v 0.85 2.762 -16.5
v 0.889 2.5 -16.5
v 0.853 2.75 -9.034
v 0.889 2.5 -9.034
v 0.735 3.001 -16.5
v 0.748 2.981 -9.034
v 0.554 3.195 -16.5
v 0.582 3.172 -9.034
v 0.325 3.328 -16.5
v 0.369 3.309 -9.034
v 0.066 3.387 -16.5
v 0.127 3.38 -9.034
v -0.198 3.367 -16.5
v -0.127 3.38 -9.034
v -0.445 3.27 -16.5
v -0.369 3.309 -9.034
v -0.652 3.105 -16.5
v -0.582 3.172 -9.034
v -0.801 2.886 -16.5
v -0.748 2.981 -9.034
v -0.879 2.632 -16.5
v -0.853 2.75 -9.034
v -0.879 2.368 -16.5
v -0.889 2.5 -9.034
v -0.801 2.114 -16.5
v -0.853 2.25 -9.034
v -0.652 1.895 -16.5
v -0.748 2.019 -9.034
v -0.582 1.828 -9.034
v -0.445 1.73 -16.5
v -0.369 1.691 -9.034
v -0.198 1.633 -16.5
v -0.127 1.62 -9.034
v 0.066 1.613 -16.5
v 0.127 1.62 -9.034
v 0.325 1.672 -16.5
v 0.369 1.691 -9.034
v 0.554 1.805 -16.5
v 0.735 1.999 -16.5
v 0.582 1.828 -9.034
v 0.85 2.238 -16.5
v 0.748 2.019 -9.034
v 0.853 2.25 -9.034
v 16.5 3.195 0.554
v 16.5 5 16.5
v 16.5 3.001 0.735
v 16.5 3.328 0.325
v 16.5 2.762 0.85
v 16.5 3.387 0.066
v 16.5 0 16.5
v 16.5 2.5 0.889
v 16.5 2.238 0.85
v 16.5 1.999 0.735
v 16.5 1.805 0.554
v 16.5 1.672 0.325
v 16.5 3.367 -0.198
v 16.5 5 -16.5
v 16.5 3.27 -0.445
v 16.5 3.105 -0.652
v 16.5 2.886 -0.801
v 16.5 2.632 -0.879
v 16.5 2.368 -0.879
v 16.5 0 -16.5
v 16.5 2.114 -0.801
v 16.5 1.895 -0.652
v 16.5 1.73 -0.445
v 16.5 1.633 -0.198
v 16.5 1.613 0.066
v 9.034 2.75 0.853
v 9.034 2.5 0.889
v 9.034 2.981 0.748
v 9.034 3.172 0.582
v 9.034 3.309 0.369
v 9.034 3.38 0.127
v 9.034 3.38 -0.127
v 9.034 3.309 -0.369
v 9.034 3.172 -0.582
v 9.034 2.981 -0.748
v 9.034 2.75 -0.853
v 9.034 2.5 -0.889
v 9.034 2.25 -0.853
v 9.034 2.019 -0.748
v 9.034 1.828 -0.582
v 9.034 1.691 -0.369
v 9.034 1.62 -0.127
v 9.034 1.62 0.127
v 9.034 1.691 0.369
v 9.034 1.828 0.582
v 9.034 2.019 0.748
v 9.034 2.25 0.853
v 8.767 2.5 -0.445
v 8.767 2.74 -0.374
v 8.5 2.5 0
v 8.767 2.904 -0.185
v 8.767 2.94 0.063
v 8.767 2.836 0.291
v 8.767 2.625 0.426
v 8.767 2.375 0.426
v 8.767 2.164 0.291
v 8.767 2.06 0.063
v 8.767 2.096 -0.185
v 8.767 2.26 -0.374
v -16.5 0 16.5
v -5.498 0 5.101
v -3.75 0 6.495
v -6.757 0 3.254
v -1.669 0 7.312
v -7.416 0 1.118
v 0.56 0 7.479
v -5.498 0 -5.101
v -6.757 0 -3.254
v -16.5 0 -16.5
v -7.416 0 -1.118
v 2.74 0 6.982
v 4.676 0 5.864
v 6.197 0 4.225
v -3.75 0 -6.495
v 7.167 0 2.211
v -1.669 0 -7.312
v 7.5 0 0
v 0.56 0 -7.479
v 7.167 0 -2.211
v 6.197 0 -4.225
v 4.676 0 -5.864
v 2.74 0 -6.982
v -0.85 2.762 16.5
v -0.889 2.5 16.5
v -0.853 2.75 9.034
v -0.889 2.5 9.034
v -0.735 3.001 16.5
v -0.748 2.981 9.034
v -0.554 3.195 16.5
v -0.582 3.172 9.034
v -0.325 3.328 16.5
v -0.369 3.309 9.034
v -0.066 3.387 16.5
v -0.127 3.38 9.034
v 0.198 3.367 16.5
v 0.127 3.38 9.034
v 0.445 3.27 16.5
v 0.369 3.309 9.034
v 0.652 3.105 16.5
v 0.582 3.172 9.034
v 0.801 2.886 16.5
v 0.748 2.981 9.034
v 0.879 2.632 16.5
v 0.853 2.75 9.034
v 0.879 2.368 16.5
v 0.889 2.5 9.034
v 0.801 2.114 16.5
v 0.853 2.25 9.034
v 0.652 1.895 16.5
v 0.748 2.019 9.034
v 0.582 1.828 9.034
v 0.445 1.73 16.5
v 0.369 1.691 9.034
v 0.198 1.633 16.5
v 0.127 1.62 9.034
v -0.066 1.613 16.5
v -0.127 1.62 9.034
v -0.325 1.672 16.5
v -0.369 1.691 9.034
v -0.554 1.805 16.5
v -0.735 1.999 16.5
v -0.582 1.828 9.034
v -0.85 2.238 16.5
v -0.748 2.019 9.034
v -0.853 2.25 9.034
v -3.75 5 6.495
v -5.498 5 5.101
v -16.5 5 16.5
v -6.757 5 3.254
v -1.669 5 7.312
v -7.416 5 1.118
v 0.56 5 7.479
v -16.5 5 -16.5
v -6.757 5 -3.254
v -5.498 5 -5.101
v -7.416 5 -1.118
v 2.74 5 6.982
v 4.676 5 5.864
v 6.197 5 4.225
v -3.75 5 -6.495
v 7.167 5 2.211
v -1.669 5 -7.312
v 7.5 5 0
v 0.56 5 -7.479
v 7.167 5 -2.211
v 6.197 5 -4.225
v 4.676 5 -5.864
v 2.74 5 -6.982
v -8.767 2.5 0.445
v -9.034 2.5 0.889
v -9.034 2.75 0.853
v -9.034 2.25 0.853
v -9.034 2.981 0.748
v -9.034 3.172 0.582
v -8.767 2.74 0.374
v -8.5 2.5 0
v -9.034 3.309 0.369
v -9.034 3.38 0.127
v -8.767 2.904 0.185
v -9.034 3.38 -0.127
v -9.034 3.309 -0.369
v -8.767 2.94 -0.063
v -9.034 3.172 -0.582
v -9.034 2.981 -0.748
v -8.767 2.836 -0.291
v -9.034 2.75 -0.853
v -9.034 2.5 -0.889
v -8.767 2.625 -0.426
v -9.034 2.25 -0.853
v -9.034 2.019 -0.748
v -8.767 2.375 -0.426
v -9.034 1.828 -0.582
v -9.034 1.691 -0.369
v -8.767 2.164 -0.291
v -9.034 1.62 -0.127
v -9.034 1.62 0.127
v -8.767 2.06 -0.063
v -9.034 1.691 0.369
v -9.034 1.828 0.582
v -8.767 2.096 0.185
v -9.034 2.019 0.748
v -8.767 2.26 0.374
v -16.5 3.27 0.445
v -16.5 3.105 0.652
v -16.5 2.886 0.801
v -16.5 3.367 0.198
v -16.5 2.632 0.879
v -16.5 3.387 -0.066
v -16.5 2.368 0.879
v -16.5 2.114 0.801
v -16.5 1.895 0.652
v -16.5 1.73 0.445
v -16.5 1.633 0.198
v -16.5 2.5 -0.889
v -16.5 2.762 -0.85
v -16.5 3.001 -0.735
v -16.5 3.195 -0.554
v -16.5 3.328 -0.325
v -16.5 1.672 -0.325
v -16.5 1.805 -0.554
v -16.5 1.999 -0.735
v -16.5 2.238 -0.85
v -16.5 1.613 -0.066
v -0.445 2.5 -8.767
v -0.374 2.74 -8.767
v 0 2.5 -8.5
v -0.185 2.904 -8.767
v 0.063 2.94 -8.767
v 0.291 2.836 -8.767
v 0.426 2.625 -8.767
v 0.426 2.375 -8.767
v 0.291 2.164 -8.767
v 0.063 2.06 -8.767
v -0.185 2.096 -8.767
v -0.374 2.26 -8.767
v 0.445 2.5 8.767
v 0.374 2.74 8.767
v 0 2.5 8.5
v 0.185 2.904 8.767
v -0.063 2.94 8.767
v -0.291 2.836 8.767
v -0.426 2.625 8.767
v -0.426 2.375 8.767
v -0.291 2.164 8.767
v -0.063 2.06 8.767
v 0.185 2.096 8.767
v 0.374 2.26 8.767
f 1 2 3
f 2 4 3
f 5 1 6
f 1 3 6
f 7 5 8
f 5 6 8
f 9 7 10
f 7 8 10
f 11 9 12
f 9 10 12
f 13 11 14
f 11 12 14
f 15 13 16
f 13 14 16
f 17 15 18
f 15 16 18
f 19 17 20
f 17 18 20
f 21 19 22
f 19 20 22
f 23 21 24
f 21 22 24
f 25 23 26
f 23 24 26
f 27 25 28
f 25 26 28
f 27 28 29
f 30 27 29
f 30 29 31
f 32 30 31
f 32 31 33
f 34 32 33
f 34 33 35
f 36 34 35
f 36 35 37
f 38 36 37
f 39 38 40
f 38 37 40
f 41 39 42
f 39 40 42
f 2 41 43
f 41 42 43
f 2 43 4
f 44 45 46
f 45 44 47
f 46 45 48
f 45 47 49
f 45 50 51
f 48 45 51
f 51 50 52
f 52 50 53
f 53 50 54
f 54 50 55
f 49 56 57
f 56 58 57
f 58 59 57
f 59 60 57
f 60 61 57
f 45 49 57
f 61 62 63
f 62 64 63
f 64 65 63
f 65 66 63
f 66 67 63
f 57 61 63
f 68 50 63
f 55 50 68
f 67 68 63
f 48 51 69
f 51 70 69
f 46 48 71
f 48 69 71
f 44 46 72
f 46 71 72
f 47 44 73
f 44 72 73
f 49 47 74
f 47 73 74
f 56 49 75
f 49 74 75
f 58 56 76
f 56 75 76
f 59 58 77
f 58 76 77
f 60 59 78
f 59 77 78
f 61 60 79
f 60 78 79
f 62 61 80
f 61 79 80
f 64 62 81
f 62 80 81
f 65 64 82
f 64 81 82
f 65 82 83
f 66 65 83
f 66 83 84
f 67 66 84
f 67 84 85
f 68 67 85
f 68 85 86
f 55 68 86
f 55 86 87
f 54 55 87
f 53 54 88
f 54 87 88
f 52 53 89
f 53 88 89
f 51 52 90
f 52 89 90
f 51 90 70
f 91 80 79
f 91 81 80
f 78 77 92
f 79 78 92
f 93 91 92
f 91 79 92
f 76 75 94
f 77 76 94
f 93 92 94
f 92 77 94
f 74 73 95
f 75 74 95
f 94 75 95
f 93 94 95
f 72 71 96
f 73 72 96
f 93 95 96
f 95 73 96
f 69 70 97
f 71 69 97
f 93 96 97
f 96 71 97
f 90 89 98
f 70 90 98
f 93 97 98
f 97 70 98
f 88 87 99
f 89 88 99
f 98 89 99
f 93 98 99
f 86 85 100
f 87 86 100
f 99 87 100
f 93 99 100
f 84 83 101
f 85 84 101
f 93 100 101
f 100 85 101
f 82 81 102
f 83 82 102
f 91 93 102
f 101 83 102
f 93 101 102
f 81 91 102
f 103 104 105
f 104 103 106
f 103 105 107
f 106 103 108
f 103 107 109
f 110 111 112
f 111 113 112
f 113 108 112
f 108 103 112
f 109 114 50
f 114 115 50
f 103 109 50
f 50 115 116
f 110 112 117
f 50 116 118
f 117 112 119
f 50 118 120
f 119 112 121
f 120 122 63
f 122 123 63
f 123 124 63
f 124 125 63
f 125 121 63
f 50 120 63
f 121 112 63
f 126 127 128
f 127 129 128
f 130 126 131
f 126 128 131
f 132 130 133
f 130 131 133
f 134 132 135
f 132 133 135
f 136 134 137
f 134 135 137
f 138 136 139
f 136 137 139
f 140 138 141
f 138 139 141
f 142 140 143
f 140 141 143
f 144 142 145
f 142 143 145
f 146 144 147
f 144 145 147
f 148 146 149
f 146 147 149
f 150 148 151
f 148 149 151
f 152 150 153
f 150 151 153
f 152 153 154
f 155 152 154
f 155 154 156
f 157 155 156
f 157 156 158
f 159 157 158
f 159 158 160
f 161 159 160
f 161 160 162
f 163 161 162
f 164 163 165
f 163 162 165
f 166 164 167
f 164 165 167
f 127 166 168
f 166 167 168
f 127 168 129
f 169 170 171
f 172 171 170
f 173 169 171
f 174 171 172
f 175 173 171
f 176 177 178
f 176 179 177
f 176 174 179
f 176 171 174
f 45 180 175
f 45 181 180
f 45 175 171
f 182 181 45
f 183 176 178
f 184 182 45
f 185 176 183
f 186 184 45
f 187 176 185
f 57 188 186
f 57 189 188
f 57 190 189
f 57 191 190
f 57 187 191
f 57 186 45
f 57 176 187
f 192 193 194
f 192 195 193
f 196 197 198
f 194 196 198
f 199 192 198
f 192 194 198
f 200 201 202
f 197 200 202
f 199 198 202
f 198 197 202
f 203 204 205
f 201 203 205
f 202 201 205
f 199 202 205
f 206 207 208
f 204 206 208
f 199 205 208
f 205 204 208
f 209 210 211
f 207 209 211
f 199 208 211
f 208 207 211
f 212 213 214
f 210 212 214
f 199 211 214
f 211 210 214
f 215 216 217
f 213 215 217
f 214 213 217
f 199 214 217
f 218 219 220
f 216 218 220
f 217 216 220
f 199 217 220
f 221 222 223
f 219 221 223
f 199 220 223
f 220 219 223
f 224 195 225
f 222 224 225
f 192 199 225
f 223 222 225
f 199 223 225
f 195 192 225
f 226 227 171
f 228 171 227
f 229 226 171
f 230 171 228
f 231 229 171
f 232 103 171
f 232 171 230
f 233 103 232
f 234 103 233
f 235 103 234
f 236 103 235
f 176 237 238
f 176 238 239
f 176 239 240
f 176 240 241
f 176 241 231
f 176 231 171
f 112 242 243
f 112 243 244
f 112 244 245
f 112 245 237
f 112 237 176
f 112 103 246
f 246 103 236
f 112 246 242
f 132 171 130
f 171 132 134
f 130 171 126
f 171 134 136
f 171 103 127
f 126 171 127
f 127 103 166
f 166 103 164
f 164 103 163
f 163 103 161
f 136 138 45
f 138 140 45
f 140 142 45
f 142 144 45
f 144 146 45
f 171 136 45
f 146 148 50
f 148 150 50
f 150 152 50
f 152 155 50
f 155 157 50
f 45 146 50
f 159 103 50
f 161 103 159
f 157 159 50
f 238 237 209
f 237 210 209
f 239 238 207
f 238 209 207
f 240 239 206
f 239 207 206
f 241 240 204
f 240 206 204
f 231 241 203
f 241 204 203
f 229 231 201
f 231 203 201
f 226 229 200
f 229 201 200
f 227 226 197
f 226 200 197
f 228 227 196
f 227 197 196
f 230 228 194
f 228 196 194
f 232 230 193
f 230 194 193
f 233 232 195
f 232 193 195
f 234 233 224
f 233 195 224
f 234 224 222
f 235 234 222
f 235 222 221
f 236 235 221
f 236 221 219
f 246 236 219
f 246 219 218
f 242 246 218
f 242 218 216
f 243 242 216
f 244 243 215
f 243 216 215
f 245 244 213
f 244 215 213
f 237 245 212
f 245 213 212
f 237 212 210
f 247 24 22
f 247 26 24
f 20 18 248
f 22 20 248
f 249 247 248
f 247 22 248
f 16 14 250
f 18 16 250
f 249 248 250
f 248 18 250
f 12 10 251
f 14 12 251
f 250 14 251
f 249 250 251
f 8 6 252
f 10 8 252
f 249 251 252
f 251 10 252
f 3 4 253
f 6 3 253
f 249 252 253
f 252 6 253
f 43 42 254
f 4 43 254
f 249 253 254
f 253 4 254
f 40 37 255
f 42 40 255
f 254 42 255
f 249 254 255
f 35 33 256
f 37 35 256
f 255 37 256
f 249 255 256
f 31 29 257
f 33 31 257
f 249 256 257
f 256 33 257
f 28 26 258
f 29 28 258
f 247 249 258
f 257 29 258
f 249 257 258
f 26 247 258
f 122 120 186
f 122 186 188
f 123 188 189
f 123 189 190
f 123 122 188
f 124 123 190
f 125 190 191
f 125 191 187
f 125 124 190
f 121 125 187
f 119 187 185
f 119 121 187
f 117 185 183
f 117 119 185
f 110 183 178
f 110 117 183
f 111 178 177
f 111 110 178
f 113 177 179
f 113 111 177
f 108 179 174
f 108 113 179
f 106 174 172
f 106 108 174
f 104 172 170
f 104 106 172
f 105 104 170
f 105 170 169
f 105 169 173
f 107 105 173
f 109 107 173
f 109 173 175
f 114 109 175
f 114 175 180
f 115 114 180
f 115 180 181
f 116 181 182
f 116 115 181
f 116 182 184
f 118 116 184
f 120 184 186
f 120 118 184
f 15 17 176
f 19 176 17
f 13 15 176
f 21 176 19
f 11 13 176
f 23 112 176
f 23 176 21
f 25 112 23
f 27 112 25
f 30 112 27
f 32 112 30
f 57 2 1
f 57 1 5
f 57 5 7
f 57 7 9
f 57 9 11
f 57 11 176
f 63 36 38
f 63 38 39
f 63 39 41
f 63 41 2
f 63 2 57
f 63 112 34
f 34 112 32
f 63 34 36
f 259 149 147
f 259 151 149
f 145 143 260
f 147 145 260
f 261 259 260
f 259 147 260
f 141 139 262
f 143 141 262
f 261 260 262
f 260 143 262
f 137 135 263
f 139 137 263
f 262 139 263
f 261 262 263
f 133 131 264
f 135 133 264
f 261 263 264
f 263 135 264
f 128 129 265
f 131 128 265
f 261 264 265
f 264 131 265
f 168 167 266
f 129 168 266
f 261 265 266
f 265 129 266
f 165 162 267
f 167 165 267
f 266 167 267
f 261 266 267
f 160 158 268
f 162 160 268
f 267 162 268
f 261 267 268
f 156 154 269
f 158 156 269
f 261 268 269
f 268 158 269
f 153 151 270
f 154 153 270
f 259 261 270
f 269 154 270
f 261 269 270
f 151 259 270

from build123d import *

# Parameters (mm, degrees)
SKETCH1_W                 = 33
SKETCH1_H                 = 33
SKETCH1_R                 = 7.5
BOSS_EXTRUDE1_DEPTH       = 5
F_2_56_TAPPED_HOLE4_D     = 1.778
F_2_56_TAPPED_HOLE4_DEPTH = 7.46583491
F_2_56_TAPPED_HOLE4_TIP   = 0.53416509
F_2_56_TAPPED_HOLE5_D     = 1.778
F_2_56_TAPPED_HOLE5_DEPTH = 7.46583491
F_2_56_TAPPED_HOLE5_TIP   = 0.53416509
F_2_56_TAPPED_HOLE6_D     = 1.778
F_2_56_TAPPED_HOLE6_DEPTH = 7.46583491
F_2_56_TAPPED_HOLE6_TIP   = 0.53416509
F_2_56_TAPPED_HOLE7_D     = 1.778
F_2_56_TAPPED_HOLE7_DEPTH = 7.46583491
F_2_56_TAPPED_HOLE7_TIP   = 0.53416509


with BuildPart() as part:
    # Sketch1 → Boss-Extrude1 (new body)
    with BuildSketch(Plane(origin=(0, 0, 0), x_dir=(1, 0, 0), z_dir=(0, 1, 0))):
        Rectangle(SKETCH1_W, SKETCH1_H)
        Circle(SKETCH1_R, mode=Mode.SUBTRACT)
    extrude(amount=BOSS_EXTRUDE1_DEPTH)

    # #2-56 Tapped Hole4
    with Locations(Plane.XY.offset(16.5)):
        with Locations((0, 2.5)):
            Hole(F_2_56_TAPPED_HOLE4_D / 2, depth=F_2_56_TAPPED_HOLE4_DEPTH)
            with Locations((0, 0, -(F_2_56_TAPPED_HOLE4_DEPTH + F_2_56_TAPPED_HOLE4_TIP / 2))):  # 118° drill point
                Cone(0, F_2_56_TAPPED_HOLE4_D / 2, F_2_56_TAPPED_HOLE4_TIP, mode=Mode.SUBTRACT)

    # #2-56 Tapped Hole5
    with Locations(Plane(origin=(0, 0, -16.5), x_dir=(-1, 0, 0), z_dir=(0, 0, -1))):
        with Locations((0, 2.5)):
            Hole(F_2_56_TAPPED_HOLE5_D / 2, depth=F_2_56_TAPPED_HOLE5_DEPTH)
            with Locations((0, 0, -(F_2_56_TAPPED_HOLE5_DEPTH + F_2_56_TAPPED_HOLE5_TIP / 2))):  # 118° drill point
                Cone(0, F_2_56_TAPPED_HOLE5_D / 2, F_2_56_TAPPED_HOLE5_TIP, mode=Mode.SUBTRACT)

    # #2-56 Tapped Hole6
    with Locations(Plane(origin=(16.5, 0, 0), x_dir=(0, 0, -1), z_dir=(1, 0, 0))):
        with Locations((0, 2.5)):
            Hole(F_2_56_TAPPED_HOLE6_D / 2, depth=F_2_56_TAPPED_HOLE6_DEPTH)
            with Locations((0, 0, -(F_2_56_TAPPED_HOLE6_DEPTH + F_2_56_TAPPED_HOLE6_TIP / 2))):  # 118° drill point
                Cone(0, F_2_56_TAPPED_HOLE6_D / 2, F_2_56_TAPPED_HOLE6_TIP, mode=Mode.SUBTRACT)

    # #2-56 Tapped Hole7
    with Locations(Plane.ZY.offset(16.5)):
        with Locations((0, 2.5)):
            Hole(F_2_56_TAPPED_HOLE7_D / 2, depth=F_2_56_TAPPED_HOLE7_DEPTH)
            with Locations((0, 0, -(F_2_56_TAPPED_HOLE7_DEPTH + F_2_56_TAPPED_HOLE7_TIP / 2))):  # 118° drill point
                Cone(0, F_2_56_TAPPED_HOLE7_D / 2, F_2_56_TAPPED_HOLE7_TIP, mode=Mode.SUBTRACT)


solid = part.part
